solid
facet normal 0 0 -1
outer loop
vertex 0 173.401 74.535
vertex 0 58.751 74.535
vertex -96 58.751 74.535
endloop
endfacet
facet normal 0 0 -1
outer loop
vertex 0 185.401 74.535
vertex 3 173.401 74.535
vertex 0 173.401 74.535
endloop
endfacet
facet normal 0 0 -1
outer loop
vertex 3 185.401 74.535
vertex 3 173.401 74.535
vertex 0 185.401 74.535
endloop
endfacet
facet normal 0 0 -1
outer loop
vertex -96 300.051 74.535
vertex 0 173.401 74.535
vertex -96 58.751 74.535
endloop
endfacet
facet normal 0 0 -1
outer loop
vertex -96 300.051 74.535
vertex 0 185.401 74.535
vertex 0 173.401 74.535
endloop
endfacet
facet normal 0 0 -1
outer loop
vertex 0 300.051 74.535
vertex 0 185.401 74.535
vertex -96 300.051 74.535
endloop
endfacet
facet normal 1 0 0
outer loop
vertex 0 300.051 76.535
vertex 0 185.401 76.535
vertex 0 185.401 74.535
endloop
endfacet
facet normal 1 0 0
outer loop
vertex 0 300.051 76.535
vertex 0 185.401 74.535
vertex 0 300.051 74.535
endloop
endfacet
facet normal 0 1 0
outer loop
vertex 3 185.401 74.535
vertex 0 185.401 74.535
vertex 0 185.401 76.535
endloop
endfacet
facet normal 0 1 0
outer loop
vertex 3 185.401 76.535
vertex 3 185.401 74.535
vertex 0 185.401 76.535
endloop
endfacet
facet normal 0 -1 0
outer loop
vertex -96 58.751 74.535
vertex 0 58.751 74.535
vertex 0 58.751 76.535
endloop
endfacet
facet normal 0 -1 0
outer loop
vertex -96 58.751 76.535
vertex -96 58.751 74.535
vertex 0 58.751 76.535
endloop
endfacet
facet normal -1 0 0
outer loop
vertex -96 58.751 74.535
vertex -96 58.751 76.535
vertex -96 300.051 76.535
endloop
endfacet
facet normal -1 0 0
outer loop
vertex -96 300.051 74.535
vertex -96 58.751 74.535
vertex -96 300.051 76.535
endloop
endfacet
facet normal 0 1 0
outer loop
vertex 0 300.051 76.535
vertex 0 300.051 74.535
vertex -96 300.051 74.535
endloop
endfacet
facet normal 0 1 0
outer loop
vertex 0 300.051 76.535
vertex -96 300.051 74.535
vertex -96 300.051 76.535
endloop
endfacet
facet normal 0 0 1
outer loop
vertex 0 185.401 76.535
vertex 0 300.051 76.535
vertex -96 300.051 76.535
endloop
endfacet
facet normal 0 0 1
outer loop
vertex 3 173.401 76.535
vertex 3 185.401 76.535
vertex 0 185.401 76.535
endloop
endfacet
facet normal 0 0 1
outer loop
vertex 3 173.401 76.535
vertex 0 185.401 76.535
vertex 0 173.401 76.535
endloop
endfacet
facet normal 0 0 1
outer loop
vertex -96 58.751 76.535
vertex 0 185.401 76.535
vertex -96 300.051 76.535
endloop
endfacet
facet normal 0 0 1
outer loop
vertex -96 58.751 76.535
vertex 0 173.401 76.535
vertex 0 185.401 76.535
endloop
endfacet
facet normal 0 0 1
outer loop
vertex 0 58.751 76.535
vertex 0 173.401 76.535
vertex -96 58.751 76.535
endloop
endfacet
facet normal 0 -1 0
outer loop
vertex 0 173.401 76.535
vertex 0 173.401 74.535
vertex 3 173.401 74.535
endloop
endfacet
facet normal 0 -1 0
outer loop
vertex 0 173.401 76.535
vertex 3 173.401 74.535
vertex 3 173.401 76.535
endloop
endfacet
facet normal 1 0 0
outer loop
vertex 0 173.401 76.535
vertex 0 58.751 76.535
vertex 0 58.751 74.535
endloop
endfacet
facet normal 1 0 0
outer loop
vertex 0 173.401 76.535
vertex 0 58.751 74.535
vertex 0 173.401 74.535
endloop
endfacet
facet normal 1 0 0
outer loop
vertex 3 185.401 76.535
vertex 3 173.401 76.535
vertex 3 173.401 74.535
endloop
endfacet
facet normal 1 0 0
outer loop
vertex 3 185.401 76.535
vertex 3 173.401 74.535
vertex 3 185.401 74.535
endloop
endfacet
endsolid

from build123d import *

# Parameters (mm, degrees)
F0_W     = 117.65
F0_H     = 2
F0_W_2   = 12
F1_DEPTH = 96
F2_DEPTH = 3
F3_DEPTH = 2
F4_DEPTH = 2
F5_DEPTH = 1
F6_DEPTH = 1


with BuildPart() as f1:
    # F0 (on Right) → F1 (new body)
    with BuildSketch(Plane.YZ):
        with Locations((244.2264966011, 75.535411799)):
            Rectangle(F0_W, F0_H)
        with Locations((179.4014966011, 75.535411799)):
            Rectangle(F0_W_2, F0_H)
        with Locations((114.5764966011, 75.535411799)):
            Rectangle(F0_W, F0_H)
    extrude(amount=-F1_DEPTH)

    # F0 (on Right) → F2 (join)
    with BuildSketch(Plane.YZ):
        with Locations((179.4014966011, 75.535411799)):
            Rectangle(F0_W_2, F0_H)
    extrude(amount=F2_DEPTH)

    # F3 (cut): a face of the model
    f3_faces = [f1.faces().sort_by_distance(p)[0] for p in [
        (-48, 55.7514966011, 75.535411799),
    ]]
    extrude(f3_faces, amount=-F3_DEPTH, mode=Mode.SUBTRACT)

    # F4 (cut): a face of the model
    f4_faces = [f1.faces().sort_by_distance(p)[0] for p in [
        (-48, 303.0514966011, 75.535411799),
    ]]
    extrude(f4_faces, amount=-F4_DEPTH, mode=Mode.SUBTRACT)

    # F5 (cut): a face of the model
    f5_faces = [f1.faces().sort_by_distance(p)[0] for p in [
        (-48, 57.7514966011, 75.535411799),
    ]]
    extrude(f5_faces, amount=-F5_DEPTH, mode=Mode.SUBTRACT)

    # F6 (cut): a face of the model
    f6_faces = [f1.faces().sort_by_distance(p)[0] for p in [
        (-48, 301.0514966011, 75.535411799),
    ]]
    extrude(f6_faces, amount=-F6_DEPTH, mode=Mode.SUBTRACT)


solid = f1.part
